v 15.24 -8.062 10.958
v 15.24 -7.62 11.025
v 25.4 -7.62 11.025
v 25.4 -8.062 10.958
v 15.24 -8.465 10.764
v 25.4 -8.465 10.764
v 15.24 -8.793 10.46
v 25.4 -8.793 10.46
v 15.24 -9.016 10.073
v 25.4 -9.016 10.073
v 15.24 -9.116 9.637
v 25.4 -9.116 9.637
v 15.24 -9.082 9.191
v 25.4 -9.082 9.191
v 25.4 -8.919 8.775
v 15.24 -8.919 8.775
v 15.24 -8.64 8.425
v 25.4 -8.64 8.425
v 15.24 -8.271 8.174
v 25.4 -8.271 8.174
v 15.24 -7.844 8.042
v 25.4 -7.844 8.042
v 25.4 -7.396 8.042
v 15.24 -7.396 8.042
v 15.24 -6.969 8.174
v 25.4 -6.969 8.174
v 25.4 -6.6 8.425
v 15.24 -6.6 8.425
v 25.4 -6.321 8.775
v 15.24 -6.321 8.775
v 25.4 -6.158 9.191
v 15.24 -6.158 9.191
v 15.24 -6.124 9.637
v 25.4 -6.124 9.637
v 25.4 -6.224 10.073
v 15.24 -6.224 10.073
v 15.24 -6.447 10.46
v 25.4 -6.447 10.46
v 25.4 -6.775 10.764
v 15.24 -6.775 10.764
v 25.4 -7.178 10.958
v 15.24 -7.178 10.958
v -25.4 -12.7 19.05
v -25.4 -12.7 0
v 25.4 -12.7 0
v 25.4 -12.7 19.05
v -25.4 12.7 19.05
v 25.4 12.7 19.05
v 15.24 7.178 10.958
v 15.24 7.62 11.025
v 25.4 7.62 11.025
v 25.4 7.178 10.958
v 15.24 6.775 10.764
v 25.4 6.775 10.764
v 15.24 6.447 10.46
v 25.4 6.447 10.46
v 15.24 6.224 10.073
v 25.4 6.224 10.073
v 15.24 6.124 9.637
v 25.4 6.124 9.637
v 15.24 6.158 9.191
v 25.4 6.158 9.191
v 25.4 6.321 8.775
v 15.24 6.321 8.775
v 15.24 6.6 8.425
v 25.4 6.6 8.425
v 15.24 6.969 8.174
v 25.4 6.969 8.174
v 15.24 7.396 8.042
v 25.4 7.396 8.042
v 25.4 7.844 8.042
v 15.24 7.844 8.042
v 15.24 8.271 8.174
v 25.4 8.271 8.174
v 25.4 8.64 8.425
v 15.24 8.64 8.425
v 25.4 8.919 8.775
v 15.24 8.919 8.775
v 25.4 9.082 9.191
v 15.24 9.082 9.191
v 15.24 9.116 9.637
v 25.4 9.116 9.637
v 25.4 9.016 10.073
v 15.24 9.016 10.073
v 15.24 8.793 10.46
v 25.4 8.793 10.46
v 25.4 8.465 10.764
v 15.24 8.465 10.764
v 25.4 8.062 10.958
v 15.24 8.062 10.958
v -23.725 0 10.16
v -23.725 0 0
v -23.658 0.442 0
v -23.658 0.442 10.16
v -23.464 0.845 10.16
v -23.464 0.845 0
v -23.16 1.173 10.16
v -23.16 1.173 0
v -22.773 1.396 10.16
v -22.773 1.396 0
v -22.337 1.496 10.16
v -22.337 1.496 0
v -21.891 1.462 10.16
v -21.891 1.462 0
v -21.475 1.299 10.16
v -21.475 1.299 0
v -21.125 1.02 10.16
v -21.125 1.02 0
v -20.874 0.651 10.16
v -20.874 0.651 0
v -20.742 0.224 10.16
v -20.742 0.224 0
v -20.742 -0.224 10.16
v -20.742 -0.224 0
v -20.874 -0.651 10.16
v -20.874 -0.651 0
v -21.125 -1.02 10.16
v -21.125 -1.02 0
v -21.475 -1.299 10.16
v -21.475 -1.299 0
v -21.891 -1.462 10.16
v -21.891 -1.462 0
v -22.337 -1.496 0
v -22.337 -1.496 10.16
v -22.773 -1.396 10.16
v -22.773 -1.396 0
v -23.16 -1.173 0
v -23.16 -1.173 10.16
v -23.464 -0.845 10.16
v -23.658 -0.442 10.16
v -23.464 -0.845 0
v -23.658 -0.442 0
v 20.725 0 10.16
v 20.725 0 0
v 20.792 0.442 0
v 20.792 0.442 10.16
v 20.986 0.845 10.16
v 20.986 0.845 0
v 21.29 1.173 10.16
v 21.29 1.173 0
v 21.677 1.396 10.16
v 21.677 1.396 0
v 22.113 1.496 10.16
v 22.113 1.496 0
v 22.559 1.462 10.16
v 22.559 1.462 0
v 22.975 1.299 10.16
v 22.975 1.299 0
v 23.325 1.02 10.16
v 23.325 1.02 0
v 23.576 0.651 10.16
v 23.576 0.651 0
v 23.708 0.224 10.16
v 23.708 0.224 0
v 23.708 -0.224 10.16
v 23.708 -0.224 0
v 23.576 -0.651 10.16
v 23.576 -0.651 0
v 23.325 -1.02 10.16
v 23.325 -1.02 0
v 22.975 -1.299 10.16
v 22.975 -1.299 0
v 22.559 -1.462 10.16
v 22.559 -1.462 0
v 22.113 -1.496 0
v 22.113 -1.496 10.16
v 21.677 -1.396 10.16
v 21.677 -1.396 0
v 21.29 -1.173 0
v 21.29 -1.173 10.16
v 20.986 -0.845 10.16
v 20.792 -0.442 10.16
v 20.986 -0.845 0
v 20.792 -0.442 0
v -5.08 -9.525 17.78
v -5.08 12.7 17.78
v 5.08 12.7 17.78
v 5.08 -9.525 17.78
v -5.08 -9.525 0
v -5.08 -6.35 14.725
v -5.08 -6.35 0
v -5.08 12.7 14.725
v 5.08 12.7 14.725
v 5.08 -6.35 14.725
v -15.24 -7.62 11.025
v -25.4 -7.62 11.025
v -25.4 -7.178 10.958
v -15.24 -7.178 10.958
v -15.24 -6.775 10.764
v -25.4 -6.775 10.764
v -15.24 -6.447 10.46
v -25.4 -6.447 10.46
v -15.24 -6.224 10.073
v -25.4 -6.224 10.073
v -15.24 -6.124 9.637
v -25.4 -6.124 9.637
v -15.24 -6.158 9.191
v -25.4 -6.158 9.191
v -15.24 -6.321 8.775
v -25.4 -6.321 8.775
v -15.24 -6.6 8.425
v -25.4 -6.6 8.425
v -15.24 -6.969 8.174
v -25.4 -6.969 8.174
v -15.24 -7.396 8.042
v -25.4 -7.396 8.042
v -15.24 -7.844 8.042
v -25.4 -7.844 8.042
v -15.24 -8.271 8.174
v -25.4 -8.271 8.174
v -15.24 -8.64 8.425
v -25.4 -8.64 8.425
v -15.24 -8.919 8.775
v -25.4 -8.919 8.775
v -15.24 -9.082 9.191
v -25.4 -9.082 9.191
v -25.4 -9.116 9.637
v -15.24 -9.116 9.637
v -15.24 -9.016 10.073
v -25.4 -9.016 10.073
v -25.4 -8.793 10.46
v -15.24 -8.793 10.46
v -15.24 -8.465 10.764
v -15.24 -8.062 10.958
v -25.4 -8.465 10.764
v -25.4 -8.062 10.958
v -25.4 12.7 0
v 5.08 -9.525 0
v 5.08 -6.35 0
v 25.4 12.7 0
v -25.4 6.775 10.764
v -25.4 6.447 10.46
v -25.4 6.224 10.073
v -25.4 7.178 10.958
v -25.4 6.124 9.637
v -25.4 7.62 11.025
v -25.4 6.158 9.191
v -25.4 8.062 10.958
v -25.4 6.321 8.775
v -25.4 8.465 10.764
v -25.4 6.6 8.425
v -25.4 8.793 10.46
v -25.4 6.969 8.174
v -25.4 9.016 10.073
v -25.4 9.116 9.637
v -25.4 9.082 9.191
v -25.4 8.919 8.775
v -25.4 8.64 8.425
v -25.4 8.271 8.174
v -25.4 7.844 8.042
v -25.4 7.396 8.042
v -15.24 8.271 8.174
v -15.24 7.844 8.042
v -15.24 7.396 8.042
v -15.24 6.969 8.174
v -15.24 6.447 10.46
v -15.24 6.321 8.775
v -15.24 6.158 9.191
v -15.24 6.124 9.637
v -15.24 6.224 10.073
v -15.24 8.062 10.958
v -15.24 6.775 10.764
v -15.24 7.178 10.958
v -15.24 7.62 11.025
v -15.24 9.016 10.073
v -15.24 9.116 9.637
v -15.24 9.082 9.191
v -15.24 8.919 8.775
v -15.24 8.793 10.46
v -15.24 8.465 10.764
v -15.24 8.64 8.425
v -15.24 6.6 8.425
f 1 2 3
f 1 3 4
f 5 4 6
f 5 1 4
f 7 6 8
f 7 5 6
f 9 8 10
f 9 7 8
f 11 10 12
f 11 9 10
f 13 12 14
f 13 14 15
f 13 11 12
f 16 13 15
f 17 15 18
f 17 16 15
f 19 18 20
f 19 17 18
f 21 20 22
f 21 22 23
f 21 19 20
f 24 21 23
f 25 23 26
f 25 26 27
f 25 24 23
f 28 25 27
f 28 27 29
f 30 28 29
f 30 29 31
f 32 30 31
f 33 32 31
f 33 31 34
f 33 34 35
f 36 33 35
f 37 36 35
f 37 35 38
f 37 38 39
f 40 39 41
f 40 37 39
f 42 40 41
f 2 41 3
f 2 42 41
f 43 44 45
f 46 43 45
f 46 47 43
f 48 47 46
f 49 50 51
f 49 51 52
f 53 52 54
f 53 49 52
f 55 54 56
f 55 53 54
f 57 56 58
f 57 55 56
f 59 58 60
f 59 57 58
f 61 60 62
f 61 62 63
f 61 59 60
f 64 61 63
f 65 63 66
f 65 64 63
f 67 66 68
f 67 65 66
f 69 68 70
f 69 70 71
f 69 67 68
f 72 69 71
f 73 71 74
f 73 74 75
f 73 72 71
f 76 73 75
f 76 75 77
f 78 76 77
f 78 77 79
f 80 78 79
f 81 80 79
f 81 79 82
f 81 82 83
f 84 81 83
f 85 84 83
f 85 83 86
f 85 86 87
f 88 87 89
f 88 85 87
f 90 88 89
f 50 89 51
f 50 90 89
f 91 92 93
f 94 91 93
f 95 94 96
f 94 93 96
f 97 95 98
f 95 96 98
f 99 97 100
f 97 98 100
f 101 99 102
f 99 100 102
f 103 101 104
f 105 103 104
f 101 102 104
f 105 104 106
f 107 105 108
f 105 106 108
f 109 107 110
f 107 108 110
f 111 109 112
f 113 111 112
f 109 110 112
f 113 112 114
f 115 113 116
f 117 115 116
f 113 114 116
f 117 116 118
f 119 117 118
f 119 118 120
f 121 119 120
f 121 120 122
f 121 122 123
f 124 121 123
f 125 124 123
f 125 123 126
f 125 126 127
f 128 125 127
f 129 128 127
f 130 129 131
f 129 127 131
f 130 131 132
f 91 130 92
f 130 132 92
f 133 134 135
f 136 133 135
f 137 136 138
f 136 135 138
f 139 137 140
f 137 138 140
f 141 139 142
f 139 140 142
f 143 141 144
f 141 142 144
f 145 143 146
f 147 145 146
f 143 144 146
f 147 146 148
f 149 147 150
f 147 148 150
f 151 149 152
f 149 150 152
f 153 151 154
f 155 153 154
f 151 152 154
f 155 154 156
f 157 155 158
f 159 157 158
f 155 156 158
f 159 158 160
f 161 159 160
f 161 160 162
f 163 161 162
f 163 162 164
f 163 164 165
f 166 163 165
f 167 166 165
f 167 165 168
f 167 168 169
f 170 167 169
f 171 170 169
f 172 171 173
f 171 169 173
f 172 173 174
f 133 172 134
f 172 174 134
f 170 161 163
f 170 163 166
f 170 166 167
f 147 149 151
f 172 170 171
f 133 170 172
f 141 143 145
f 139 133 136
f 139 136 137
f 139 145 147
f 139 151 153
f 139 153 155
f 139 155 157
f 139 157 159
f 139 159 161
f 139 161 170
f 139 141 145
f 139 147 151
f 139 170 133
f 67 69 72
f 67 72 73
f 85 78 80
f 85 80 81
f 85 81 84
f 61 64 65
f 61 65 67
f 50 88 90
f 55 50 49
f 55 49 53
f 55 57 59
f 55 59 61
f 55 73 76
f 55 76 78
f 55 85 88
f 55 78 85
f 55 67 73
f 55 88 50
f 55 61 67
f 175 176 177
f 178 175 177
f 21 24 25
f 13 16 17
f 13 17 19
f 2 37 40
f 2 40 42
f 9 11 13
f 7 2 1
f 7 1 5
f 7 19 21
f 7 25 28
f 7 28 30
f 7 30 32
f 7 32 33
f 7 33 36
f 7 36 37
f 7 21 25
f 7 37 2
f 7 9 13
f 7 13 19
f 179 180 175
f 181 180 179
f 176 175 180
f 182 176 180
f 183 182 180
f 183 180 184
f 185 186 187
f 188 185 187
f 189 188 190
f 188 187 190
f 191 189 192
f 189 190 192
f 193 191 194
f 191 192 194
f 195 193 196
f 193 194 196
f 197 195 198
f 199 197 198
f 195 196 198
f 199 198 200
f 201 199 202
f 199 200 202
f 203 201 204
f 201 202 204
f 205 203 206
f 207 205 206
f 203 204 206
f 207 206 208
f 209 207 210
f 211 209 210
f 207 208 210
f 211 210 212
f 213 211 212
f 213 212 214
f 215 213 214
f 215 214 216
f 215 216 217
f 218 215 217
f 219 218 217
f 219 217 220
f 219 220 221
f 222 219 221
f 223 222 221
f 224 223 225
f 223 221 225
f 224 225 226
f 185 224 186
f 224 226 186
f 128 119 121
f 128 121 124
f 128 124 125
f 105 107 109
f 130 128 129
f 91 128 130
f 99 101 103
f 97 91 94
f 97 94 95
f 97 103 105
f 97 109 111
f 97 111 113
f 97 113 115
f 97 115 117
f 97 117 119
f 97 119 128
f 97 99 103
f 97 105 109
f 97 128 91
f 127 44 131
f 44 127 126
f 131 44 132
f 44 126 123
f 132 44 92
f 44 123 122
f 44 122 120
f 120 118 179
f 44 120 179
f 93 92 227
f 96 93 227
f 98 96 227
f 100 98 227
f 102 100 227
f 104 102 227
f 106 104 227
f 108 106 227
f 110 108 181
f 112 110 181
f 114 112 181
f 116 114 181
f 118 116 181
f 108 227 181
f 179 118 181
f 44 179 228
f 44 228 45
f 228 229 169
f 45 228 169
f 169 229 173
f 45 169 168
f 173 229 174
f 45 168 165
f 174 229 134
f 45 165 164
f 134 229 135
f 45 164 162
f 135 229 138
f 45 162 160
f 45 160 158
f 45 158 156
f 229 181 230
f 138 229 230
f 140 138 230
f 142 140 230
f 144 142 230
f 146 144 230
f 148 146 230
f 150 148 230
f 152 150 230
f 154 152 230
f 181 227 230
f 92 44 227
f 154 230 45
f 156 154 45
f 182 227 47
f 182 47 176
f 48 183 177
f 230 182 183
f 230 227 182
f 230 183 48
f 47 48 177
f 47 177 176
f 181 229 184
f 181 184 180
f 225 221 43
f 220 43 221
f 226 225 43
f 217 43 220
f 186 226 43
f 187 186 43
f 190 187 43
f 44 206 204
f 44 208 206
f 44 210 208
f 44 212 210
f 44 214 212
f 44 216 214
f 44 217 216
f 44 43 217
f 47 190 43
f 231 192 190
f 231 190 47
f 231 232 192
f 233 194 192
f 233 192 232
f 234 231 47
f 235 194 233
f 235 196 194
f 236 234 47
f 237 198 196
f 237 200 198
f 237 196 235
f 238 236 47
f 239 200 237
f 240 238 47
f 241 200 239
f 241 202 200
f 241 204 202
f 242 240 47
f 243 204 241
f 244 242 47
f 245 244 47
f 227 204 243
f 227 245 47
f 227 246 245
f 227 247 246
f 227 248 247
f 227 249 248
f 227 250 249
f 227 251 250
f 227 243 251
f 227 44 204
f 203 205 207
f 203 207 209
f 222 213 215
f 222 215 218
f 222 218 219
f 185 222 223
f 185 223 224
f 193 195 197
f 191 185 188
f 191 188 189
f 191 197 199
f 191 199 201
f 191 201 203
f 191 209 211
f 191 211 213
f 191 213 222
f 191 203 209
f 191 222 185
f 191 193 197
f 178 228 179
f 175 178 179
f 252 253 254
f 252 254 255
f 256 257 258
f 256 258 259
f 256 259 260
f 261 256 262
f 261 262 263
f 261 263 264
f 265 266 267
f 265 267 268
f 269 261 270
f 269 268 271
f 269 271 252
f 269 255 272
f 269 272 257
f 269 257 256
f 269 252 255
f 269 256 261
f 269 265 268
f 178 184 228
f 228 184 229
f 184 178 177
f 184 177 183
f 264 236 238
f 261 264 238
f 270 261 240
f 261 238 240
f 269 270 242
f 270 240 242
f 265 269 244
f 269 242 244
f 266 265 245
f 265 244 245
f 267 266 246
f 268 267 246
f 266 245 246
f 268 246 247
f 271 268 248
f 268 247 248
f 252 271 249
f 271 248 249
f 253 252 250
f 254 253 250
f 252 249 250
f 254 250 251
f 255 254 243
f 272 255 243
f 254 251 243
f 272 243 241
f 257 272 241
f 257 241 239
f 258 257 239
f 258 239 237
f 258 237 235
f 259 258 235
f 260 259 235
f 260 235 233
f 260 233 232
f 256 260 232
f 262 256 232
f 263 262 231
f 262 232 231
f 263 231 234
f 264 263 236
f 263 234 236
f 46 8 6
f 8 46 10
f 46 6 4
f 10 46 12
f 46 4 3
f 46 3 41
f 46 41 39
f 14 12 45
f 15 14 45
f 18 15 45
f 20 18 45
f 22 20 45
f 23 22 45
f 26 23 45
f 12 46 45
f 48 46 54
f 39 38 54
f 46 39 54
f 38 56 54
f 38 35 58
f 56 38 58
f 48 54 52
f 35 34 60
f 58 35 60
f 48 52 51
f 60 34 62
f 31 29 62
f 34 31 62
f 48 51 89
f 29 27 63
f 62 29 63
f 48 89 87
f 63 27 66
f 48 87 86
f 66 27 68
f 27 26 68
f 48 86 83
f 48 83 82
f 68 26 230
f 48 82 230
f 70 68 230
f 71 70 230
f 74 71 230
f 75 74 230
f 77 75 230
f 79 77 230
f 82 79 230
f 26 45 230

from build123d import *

# Parameters (mm, degrees)
SKETCH1_W           = 50.8
SKETCH1_H           = 25.4
BOSS_EXTRUDE1_DEPTH = 19.05
SKETCH4_W           = 10.16
SKETCH4_H           = 3.054556314
CUT_EXTRUDE2_DEPTH  = 19.05
SKETCH5_W           = 10.16
SKETCH5_H           = 3.175
CUT_EXTRUDE3_DEPTH  = 17.78
SKETCH6_R           = 1.5
CUT_EXTRUDE4_DEPTH  = 10.16
CUT_EXTRUDE5_START  = -10.16
SKETCH7_R           = 1.5
CUT_EXTRUDE5_DEPTH  = 10.16
SKETCH8_R           = 1.5
CUT_EXTRUDE6_DEPTH  = 10.16


with BuildPart() as part:
    # Sketch1 → Boss-Extrude1 (new body)
    with BuildSketch(Plane.XY):
        Rectangle(SKETCH1_W, SKETCH1_H)
    extrude(amount=BOSS_EXTRUDE1_DEPTH)

    # Sketch4 → Cut-Extrude2 (cut)
    with BuildSketch(Plane(origin=(0, 12.7, 0), x_dir=(1, 0, 0), z_dir=(0, 1, 0))):
        with Locations((0, -16.252721843)):
            Rectangle(SKETCH4_W, SKETCH4_H)
    extrude(amount=-CUT_EXTRUDE2_DEPTH, mode=Mode.SUBTRACT)

    # Sketch5 → Cut-Extrude3 (cut)
    with BuildSketch(Plane(origin=(0, 0, 0), x_dir=(-1, 0, 0), z_dir=(0, 0, -1))):
        with Locations((0, -7.9375)):
            Rectangle(SKETCH5_W, SKETCH5_H)
    extrude(amount=-CUT_EXTRUDE3_DEPTH, mode=Mode.SUBTRACT)

    # Sketch6 → Cut-Extrude4 (cut)
    with BuildSketch(Plane.ZY.offset(25.4)):
        with Locations((9.525, -7.62)):
            Circle(SKETCH6_R)
        with Locations((9.525, 7.62)):
            Circle(SKETCH6_R)
    extrude(amount=-CUT_EXTRUDE4_DEPTH, mode=Mode.SUBTRACT)

    # Sketch7 → Cut-Extrude5 (cut)
    with BuildSketch(Plane(origin=(25.4, 0, 0), x_dir=(0, 0, -1), z_dir=(1, 0, 0)).offset(CUT_EXTRUDE5_START)):
        with Locations(Location((-9.525, 7.62, 0), (0, 0, 180))):
            Circle(SKETCH7_R)
        with Locations(Location((-9.525, -7.62, 0), (0, 0, 180))):
            Circle(SKETCH7_R)
    extrude(amount=CUT_EXTRUDE5_DEPTH, mode=Mode.SUBTRACT)

    # Sketch8 → Cut-Extrude6 (cut)
    with BuildSketch(Plane(origin=(0, 0, 0), x_dir=(-1, 0, 0), z_dir=(0, 0, -1))):
        with Locations((22.225, 0)):
            Circle(SKETCH8_R)
        with Locations((-22.225, 0)):
            Circle(SKETCH8_R)
    extrude(amount=-CUT_EXTRUDE6_DEPTH, mode=Mode.SUBTRACT)


solid = part.part
